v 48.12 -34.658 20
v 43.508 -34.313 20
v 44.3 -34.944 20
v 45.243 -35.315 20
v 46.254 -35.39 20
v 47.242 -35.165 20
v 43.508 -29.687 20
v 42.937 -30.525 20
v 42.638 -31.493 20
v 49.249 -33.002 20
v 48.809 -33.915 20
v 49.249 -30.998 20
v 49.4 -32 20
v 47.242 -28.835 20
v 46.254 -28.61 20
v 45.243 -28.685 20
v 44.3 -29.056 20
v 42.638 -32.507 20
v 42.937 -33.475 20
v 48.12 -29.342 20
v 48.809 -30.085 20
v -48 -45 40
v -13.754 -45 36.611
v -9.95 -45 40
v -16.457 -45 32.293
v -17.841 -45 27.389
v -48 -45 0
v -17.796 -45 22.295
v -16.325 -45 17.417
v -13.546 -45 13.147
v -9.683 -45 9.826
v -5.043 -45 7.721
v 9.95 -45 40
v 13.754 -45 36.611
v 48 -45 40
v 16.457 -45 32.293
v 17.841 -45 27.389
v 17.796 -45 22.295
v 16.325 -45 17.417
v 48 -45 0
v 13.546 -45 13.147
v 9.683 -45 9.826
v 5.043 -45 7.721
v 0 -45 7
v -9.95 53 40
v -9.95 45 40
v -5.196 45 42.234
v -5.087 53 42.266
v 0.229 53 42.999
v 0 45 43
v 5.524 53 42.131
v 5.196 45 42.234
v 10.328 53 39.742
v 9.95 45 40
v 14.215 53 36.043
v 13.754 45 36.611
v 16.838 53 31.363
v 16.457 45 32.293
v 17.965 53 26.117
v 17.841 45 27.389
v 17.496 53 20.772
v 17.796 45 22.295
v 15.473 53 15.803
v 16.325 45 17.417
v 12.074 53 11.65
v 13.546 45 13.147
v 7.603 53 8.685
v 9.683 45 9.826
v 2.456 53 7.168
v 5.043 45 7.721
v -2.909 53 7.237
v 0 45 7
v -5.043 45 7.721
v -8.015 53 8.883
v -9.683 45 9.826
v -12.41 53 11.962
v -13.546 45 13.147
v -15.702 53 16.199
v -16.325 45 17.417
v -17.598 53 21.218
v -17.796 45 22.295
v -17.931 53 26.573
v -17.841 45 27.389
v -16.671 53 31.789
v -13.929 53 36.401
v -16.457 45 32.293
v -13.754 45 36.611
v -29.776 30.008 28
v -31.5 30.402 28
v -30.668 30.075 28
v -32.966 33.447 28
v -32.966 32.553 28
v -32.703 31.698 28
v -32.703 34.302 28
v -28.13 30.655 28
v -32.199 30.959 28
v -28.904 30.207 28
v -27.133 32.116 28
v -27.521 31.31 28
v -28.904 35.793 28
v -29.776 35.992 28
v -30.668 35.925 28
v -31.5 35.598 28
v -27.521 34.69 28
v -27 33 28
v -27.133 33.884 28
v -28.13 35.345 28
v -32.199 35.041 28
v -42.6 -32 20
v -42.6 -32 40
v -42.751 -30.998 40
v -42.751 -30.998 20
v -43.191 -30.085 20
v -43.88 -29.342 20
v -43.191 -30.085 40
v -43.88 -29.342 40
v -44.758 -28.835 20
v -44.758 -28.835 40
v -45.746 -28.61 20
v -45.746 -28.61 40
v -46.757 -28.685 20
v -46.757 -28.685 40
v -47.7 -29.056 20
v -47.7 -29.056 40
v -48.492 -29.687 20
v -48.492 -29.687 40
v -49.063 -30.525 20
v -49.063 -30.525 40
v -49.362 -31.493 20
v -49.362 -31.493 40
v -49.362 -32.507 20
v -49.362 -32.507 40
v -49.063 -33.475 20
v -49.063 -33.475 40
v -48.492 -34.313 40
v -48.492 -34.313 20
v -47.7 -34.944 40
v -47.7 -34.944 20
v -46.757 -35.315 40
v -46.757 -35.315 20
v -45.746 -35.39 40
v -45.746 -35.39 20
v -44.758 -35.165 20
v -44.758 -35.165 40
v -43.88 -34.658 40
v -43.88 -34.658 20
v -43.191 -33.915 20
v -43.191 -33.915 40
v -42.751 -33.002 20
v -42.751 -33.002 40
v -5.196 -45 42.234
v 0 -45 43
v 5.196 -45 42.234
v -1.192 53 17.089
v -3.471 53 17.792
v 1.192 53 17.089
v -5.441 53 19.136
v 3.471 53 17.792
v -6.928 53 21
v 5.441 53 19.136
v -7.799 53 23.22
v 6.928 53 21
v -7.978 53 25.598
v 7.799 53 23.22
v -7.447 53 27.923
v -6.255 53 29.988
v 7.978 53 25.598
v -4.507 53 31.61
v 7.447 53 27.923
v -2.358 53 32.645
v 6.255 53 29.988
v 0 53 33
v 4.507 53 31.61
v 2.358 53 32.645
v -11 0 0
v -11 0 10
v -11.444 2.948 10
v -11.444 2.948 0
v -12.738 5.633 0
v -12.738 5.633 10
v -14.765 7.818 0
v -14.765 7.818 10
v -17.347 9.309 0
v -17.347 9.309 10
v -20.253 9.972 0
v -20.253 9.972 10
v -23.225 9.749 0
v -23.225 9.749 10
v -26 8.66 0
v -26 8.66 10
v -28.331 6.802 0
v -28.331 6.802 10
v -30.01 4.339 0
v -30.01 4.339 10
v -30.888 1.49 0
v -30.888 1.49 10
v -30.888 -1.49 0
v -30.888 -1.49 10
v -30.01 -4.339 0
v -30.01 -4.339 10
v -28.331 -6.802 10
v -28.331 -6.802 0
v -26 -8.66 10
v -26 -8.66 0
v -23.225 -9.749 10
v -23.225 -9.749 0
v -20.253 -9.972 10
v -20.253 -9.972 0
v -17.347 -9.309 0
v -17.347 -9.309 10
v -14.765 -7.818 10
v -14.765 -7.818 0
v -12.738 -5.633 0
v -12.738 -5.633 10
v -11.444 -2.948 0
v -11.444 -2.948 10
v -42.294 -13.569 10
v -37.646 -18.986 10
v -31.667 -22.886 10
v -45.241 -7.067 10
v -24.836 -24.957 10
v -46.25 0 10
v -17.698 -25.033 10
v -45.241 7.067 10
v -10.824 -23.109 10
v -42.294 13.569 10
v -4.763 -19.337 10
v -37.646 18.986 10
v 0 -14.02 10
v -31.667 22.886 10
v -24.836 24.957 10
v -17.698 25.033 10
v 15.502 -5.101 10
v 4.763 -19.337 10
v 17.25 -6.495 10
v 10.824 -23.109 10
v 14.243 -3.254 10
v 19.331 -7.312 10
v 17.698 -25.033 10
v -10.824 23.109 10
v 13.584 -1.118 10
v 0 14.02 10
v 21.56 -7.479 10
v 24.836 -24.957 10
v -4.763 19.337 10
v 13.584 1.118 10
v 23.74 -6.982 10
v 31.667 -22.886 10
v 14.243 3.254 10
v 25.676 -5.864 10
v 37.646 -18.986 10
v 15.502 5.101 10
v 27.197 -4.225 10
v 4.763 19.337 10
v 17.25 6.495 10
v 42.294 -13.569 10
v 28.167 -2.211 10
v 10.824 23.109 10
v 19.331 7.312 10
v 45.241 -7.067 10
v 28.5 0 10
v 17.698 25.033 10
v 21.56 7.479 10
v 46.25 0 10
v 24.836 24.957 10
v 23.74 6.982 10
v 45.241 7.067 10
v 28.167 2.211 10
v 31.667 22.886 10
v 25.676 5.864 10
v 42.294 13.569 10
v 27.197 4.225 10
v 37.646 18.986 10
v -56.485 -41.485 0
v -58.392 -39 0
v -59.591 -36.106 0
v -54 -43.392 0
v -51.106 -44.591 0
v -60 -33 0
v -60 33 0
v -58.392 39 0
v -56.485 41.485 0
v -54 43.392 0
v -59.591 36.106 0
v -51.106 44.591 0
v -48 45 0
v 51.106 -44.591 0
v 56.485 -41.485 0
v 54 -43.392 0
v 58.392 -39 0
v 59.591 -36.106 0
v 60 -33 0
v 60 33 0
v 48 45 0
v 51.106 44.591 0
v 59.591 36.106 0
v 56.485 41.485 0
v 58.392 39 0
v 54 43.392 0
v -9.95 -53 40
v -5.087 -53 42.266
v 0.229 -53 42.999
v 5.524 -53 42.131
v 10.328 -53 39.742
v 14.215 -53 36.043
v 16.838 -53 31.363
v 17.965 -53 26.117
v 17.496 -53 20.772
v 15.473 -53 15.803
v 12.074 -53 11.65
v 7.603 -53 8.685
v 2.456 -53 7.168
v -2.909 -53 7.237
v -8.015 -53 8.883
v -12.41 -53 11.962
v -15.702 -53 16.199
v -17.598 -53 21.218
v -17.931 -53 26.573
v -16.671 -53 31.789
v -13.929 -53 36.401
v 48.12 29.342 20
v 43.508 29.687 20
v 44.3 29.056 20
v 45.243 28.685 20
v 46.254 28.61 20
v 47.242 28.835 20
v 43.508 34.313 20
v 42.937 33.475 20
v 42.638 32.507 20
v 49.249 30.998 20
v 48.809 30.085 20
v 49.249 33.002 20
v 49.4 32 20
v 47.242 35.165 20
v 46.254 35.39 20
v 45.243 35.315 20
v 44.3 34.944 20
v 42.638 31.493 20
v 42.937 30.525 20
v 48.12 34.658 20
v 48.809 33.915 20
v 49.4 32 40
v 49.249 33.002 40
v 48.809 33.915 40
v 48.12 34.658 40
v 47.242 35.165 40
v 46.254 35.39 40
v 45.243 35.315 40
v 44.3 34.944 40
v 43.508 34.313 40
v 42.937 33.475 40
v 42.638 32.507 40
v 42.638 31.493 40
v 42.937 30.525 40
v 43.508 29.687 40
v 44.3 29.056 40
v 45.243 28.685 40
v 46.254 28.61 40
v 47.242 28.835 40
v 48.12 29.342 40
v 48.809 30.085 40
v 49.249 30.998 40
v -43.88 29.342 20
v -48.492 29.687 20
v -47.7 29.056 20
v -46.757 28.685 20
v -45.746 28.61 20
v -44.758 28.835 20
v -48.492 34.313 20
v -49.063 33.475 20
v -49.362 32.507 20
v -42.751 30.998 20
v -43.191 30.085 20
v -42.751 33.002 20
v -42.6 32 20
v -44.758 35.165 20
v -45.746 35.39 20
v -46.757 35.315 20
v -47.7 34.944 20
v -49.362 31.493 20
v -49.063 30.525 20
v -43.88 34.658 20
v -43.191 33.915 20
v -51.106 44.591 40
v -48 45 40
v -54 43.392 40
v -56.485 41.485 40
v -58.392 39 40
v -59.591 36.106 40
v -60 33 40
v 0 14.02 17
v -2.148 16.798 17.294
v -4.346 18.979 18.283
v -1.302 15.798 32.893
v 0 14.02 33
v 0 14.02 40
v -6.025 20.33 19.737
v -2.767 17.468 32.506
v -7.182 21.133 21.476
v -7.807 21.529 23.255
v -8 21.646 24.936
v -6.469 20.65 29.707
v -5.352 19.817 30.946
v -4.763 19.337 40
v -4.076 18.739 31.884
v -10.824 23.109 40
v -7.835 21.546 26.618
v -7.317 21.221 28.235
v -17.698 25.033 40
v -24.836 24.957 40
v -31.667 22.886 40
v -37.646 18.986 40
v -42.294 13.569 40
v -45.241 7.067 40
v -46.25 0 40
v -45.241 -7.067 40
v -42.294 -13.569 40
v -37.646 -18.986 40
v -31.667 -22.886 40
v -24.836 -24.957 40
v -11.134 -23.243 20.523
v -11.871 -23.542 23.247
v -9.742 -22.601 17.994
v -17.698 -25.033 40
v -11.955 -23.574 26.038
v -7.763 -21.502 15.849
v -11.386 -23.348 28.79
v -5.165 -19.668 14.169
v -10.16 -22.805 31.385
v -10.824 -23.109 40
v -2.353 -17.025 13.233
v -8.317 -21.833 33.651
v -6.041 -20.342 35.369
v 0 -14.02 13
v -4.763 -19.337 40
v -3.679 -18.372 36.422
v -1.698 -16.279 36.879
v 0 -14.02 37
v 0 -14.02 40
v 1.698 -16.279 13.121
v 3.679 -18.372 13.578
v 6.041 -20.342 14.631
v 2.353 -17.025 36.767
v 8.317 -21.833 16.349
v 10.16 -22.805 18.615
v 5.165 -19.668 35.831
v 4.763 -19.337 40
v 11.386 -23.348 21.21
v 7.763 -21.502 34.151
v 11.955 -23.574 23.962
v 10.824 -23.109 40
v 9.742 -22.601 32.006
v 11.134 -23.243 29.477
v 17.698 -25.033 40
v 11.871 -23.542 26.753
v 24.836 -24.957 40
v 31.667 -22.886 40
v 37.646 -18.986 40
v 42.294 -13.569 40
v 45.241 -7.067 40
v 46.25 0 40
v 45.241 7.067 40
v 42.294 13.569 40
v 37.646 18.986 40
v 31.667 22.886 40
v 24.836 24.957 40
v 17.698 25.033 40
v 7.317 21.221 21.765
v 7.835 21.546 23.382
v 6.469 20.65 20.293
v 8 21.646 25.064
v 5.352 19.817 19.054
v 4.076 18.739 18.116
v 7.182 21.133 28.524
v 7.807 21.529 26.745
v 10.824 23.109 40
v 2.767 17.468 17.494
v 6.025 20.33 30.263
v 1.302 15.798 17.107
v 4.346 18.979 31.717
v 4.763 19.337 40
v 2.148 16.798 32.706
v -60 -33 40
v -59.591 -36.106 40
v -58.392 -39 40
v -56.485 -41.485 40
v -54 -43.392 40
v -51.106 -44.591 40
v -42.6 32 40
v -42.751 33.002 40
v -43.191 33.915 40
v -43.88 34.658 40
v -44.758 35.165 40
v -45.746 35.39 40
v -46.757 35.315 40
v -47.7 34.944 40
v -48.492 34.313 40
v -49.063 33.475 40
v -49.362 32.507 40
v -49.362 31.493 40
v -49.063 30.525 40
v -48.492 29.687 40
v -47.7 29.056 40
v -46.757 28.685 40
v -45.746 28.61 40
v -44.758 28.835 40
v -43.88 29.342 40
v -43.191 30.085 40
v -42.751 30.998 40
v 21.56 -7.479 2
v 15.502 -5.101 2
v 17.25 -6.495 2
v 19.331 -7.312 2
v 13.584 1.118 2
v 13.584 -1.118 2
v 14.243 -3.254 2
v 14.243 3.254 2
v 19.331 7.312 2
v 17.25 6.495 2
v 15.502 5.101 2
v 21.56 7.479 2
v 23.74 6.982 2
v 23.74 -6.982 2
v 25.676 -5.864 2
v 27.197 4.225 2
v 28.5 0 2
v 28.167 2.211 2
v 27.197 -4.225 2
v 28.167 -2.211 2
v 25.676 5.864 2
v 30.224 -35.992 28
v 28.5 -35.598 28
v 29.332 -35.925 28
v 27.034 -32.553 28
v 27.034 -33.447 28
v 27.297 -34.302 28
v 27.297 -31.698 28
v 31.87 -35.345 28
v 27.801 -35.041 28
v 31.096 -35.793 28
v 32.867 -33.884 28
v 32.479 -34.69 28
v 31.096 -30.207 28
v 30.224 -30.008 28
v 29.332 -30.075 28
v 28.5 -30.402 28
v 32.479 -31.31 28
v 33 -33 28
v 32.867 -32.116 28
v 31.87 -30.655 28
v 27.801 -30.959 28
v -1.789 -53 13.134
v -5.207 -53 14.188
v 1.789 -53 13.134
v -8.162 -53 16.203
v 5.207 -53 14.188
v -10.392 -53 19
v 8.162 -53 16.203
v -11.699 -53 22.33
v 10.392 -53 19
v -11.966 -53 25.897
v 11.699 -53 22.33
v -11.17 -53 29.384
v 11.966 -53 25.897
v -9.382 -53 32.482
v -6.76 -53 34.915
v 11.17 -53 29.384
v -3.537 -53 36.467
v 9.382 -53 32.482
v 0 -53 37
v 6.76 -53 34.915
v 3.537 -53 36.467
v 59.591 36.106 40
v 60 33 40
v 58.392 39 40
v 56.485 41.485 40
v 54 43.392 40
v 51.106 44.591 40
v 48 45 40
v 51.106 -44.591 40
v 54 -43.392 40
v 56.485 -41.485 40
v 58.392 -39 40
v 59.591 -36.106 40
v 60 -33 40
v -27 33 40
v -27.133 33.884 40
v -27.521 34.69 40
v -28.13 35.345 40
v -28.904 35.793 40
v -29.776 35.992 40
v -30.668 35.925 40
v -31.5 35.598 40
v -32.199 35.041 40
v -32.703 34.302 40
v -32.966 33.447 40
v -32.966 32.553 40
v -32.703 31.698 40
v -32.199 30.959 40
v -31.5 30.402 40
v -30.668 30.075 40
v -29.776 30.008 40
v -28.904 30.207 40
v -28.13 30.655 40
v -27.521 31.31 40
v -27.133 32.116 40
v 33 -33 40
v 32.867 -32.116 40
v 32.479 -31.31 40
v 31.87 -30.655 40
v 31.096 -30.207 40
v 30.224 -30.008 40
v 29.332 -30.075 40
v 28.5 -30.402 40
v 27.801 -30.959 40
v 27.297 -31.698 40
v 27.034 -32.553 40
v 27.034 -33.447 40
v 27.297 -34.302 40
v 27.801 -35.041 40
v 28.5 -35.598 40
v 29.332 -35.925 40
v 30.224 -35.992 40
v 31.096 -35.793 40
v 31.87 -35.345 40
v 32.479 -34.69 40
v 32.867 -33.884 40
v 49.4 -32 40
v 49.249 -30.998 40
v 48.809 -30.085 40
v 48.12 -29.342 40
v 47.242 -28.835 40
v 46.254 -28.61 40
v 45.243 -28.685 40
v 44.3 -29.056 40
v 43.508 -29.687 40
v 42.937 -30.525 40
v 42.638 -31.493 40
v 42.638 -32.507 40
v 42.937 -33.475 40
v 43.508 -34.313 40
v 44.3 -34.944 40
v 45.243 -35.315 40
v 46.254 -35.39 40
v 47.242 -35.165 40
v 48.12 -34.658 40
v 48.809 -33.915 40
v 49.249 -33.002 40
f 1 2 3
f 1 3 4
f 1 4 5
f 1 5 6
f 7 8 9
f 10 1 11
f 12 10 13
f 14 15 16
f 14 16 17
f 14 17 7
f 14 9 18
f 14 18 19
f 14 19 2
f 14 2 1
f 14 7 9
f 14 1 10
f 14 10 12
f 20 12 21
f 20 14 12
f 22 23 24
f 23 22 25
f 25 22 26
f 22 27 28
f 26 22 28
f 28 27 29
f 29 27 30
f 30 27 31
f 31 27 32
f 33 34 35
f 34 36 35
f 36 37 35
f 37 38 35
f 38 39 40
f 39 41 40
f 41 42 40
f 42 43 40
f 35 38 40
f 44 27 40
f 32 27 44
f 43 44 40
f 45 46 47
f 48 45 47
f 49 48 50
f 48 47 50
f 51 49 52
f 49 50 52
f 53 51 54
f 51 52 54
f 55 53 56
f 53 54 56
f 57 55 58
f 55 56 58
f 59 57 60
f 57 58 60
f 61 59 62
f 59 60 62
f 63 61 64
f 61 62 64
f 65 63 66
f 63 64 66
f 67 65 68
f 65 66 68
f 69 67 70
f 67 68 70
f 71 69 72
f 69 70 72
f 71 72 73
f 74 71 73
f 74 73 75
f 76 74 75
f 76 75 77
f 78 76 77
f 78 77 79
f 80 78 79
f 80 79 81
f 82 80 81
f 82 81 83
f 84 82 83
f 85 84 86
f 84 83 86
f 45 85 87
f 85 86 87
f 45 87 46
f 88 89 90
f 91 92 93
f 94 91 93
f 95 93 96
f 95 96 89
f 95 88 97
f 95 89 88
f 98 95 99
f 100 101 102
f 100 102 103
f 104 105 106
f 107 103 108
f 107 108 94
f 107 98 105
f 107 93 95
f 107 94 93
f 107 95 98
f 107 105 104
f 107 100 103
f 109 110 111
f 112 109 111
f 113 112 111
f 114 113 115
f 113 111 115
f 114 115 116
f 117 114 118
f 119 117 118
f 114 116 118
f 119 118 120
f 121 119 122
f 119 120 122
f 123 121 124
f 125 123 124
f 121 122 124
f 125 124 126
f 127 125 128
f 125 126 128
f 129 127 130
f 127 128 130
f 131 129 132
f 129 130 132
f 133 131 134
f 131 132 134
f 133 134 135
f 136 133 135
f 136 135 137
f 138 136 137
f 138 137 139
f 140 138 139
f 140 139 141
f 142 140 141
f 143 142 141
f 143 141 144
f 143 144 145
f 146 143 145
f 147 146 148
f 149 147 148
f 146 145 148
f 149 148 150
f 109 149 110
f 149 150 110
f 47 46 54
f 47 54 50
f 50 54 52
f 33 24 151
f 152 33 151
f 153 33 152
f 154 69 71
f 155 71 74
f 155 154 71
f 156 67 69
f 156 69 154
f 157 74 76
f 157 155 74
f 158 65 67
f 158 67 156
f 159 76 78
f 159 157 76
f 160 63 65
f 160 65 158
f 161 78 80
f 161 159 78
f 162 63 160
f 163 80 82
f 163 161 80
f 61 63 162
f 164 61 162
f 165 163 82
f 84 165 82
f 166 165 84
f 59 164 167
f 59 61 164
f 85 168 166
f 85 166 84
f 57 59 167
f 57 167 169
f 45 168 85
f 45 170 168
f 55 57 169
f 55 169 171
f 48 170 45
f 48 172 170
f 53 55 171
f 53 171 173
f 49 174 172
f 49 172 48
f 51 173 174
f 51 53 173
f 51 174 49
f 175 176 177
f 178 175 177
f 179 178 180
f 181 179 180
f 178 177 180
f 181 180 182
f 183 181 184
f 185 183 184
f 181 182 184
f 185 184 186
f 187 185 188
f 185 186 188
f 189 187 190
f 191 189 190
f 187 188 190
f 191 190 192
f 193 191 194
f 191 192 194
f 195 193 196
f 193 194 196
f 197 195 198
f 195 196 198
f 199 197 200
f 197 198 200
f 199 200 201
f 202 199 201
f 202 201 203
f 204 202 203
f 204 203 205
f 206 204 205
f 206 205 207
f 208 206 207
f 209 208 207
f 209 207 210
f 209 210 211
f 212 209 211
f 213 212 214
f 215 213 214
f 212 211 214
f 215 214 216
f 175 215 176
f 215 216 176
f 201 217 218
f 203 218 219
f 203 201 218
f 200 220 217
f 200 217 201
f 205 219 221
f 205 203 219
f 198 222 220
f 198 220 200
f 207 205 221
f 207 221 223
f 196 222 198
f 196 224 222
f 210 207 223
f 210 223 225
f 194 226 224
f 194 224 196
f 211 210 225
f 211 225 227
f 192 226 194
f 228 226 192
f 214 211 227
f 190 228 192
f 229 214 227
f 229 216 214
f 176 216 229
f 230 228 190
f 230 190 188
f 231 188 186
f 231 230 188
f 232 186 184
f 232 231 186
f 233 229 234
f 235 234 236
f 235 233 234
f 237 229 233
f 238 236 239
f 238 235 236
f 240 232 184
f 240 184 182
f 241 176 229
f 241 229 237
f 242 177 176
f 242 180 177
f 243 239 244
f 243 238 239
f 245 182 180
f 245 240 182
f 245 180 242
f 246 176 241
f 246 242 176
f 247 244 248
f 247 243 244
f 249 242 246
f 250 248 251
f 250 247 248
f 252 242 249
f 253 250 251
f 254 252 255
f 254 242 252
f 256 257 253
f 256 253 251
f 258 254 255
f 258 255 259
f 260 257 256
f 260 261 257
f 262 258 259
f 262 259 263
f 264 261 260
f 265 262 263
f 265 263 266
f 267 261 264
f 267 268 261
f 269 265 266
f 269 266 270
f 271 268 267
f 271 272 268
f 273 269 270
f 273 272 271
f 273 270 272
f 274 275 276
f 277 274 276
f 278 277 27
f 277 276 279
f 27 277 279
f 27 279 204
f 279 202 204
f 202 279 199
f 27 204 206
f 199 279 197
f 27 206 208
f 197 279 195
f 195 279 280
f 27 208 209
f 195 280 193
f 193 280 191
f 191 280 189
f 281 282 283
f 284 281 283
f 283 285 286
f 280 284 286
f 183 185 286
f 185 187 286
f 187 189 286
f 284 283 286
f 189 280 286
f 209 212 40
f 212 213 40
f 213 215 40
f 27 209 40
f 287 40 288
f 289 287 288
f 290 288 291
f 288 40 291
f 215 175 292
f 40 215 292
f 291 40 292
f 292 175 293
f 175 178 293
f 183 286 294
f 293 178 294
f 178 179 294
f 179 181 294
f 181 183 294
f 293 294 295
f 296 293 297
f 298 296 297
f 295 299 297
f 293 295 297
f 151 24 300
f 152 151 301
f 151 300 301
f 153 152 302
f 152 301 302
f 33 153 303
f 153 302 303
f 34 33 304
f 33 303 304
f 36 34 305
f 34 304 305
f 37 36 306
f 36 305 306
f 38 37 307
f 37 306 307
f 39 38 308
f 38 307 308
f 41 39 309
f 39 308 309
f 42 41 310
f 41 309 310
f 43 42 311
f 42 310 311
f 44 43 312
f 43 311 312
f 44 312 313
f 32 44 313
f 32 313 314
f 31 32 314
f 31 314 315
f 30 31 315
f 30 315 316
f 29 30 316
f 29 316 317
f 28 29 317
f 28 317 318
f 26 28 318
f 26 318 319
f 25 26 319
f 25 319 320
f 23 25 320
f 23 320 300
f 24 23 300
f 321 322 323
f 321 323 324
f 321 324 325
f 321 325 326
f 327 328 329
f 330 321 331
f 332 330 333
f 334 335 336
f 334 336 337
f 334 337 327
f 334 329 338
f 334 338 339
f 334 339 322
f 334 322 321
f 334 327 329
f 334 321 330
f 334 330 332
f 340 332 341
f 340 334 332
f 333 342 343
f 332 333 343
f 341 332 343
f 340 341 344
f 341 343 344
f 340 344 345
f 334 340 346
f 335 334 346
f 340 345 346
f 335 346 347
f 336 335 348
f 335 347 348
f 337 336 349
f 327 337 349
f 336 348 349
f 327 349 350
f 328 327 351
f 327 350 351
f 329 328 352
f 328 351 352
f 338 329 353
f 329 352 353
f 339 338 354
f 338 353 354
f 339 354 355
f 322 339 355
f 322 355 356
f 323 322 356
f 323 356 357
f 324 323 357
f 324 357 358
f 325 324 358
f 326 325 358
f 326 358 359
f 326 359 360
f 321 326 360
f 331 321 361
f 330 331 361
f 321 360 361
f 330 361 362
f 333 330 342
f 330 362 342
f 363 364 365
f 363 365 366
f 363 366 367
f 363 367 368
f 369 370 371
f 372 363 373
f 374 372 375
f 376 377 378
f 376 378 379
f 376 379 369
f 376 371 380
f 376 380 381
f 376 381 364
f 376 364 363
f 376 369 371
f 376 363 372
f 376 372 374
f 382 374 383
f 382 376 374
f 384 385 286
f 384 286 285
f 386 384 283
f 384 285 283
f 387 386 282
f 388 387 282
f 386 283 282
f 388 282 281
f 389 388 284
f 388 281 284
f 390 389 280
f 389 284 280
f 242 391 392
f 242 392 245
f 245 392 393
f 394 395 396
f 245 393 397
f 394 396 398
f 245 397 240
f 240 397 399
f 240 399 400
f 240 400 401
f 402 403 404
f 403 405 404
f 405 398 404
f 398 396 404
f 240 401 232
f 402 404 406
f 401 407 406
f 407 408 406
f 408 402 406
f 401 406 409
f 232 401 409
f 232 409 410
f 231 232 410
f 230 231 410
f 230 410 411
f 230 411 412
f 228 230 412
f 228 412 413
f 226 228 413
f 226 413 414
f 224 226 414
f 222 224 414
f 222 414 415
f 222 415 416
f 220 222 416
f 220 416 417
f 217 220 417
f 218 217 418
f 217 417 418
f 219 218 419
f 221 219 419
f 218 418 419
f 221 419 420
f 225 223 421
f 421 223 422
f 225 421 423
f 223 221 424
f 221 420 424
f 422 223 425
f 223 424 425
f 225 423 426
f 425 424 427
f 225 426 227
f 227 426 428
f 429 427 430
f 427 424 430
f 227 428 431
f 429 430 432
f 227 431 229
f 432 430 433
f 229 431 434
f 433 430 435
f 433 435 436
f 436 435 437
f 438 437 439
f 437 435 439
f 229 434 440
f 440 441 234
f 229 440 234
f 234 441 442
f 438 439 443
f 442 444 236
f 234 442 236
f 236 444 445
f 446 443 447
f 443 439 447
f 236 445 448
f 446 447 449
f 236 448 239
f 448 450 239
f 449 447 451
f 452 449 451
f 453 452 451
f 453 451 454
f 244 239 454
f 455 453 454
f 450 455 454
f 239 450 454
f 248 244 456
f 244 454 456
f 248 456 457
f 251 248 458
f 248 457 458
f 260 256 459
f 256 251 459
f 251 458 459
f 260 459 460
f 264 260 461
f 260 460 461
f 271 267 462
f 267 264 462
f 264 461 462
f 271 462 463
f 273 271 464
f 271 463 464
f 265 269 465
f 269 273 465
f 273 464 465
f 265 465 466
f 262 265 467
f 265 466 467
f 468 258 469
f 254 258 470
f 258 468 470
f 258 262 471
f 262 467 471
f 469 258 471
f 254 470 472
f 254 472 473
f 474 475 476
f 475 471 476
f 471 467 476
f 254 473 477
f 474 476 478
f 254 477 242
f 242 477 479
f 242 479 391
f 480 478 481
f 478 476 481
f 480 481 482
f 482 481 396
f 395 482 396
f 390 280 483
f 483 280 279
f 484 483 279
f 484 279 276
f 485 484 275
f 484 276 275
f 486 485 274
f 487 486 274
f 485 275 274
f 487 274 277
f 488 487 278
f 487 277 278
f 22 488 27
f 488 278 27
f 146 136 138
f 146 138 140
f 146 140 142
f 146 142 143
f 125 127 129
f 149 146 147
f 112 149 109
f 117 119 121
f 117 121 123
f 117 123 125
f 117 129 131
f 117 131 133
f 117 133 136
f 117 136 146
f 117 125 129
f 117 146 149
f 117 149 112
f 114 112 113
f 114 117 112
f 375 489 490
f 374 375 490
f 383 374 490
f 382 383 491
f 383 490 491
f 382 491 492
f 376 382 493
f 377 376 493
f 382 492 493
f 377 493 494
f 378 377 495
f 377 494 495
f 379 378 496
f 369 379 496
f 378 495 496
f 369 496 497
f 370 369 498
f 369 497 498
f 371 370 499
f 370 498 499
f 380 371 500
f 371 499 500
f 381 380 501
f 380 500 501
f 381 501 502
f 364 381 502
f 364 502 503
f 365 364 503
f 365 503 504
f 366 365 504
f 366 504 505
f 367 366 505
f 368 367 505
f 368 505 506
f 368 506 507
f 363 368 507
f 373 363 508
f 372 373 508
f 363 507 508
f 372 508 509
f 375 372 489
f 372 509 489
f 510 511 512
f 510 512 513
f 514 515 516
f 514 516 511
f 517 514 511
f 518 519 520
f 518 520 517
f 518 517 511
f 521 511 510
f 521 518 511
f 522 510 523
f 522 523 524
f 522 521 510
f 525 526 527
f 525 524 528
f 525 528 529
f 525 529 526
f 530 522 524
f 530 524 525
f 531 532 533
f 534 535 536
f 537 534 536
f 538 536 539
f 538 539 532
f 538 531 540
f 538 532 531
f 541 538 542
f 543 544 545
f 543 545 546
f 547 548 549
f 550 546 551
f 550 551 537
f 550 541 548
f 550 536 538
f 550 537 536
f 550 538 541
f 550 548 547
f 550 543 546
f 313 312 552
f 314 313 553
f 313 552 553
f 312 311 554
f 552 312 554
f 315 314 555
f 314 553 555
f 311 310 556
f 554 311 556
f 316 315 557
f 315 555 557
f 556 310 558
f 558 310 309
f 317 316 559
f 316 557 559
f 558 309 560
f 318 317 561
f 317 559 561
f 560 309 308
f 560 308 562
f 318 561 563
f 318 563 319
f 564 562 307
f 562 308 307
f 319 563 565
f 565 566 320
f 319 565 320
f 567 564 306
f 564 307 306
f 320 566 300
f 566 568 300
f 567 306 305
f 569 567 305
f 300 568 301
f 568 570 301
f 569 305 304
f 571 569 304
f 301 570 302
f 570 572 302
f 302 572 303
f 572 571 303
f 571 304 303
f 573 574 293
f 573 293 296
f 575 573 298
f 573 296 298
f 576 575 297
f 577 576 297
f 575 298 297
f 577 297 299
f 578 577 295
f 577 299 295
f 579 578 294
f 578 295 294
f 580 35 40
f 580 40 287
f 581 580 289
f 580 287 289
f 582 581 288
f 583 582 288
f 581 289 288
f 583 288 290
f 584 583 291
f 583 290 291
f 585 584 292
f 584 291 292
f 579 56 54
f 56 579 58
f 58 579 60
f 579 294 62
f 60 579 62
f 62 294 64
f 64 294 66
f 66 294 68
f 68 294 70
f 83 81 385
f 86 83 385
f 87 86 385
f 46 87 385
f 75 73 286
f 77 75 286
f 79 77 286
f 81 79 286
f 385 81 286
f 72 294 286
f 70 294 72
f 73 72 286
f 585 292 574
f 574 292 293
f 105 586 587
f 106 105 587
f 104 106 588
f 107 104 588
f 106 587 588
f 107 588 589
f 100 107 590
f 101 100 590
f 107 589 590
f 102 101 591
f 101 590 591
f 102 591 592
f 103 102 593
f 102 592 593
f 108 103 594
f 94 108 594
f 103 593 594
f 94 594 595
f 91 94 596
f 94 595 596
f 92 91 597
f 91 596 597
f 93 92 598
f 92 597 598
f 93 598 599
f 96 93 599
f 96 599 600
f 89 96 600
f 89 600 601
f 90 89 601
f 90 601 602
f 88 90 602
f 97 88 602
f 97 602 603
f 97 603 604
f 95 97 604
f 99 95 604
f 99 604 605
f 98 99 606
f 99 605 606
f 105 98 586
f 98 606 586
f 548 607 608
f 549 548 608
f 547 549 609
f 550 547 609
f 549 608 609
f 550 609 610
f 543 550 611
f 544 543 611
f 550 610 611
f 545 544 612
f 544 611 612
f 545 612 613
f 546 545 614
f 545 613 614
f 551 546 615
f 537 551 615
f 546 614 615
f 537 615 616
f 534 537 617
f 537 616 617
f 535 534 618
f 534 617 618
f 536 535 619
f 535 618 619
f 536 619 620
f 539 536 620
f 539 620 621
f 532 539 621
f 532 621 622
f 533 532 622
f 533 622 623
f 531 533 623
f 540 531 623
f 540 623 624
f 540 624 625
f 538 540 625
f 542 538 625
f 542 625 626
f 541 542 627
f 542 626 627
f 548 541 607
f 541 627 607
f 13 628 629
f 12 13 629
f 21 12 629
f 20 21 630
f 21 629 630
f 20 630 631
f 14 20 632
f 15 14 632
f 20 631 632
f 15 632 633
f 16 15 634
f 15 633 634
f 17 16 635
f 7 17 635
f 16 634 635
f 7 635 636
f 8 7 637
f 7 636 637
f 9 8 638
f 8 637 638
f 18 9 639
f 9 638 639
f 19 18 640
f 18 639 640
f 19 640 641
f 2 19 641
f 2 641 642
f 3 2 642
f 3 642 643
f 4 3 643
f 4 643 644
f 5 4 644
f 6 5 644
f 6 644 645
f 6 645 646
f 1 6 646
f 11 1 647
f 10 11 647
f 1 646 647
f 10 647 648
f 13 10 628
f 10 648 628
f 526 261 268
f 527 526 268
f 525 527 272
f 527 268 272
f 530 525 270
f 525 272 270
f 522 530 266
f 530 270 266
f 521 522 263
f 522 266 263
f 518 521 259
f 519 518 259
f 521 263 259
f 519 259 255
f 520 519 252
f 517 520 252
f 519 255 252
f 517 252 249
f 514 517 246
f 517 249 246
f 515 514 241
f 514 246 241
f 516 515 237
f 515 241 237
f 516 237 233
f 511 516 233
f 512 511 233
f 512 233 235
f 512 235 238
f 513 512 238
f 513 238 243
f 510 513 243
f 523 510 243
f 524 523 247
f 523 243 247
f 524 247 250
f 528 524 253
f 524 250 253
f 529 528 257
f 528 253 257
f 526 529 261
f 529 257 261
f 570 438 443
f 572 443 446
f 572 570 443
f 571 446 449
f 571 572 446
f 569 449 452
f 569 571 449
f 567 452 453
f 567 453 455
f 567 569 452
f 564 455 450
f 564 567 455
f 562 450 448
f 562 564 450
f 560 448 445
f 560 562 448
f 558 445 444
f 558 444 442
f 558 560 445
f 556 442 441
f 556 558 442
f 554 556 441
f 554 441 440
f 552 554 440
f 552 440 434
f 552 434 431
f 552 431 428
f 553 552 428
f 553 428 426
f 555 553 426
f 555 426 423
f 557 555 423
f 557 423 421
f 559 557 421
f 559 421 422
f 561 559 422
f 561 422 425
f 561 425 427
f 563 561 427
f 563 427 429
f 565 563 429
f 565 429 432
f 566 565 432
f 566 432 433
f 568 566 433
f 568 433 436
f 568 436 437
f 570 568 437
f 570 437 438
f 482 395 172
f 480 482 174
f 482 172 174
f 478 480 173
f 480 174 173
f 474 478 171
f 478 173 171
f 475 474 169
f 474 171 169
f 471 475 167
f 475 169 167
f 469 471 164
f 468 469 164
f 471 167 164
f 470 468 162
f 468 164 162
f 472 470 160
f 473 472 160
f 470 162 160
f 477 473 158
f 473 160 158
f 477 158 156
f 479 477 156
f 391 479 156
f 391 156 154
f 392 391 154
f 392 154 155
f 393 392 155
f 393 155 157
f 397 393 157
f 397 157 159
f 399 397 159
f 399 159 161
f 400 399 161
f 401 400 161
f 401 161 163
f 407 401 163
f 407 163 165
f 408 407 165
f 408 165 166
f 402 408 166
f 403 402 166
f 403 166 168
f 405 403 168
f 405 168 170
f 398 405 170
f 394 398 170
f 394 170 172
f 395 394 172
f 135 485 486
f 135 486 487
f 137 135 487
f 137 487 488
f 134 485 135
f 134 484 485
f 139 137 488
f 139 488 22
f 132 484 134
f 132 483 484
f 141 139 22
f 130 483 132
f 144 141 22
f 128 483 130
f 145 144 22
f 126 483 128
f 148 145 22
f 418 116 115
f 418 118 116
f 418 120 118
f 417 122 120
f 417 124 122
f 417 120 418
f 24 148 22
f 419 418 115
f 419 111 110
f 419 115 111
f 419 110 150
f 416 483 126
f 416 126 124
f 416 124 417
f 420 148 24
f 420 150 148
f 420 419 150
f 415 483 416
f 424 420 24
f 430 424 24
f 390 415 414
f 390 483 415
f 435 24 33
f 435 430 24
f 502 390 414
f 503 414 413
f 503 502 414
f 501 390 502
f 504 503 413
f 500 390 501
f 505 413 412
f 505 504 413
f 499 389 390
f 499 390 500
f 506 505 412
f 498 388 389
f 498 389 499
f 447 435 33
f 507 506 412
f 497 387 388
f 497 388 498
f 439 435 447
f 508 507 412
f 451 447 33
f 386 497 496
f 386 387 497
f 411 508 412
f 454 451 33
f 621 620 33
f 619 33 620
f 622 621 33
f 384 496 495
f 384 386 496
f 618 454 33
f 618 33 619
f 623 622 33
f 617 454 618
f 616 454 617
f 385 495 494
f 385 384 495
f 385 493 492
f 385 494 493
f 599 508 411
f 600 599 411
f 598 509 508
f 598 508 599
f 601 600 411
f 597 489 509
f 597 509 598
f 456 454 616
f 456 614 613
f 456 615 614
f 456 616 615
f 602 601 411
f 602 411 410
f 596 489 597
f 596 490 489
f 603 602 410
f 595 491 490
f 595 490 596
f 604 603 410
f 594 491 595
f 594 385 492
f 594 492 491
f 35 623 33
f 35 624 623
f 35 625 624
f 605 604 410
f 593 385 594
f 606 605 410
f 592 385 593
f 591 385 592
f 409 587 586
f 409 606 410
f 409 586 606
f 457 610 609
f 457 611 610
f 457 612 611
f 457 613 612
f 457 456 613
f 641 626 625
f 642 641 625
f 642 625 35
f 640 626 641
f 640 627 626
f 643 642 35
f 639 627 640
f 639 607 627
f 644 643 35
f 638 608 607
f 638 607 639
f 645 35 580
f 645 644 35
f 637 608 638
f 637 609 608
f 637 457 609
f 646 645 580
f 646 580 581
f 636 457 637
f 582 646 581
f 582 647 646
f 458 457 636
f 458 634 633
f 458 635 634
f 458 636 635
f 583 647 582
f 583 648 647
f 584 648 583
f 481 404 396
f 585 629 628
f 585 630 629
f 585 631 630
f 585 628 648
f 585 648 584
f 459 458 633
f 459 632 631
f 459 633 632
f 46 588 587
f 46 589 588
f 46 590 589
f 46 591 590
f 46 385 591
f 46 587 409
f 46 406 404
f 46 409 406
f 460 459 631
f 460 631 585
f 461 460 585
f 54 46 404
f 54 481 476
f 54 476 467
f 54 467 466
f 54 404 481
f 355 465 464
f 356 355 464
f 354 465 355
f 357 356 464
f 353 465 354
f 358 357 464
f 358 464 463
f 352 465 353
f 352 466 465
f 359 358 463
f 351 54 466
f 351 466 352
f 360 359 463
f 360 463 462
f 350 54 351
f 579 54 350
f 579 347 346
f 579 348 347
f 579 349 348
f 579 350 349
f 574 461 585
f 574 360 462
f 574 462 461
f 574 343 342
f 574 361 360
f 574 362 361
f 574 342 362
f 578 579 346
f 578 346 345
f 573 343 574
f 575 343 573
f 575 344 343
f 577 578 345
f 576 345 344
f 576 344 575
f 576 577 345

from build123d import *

# Parameters (mm, degrees)
EXTRUDE_1_DEPTH     = 40
SKETCH_2_R          = 18
EXTRUDE_2_DEPTH     = 8
EXTRUDE_START       = -8
SKETCH_3_R          = 18
EXTRUDE_3_DEPTH     = 8
SKETCH_4_R          = 25.25
CUT_EXTRUDE_1_DEPTH = 30
SKETCH_5_R          = 25.25
CUT_EXTRUDE_2_DEPTH = 30
SKETCH_6_R          = 10
CUT_EXTRUDE_3_DEPTH = 10
SKETCH_7_R          = 7.5
CUT_EXTRUDE_4_DEPTH = 8
SKETCH_8_R          = 12
CUT_EXTRUDE_5_DEPTH = 40
SKETCH_9_R          = 8
CUT_EXTRUDE_6_DEPTH = 40
SKETCH_10_R         = 3.4
CUT_EXTRUDE_7_DEPTH = 20
SKETCH_11_R         = 3
CUT_EXTRUDE_8_DEPTH = 12


with BuildPart() as part:
    # 草图1 → 凸台-拉伸1 (new body)
    with BuildSketch(Plane.XY):
        with BuildLine():
            Line((-48, -45), (48, -45))
            ThreePointArc((48, -45), (56.485281374, -41.485281374), (60, -33))
            Line((60, -33), (60, 33))
            ThreePointArc((60, 33), (56.485281374, 41.485281374), (48, 45))
            Line((48, 45), (-48, 45))
            ThreePointArc((-48, 45), (-56.485281374, 41.485281374), (-60, 33))
            Line((-60, 33), (-60, -33))
            ThreePointArc((-60, -33), (-56.485281374, -41.485281374), (-48, -45))
        make_face()
    extrude(amount=EXTRUDE_1_DEPTH)

    # 草图2 → 凸台-拉伸2 (add)
    with BuildSketch(Plane(origin=(0, 45, 0), x_dir=(1, 0, 0), z_dir=(0, 1, 0))):
        with Locations(Location((0, -25, 0), (0, 0, 236.442690238))):
            Circle(SKETCH_2_R)
    extrude(amount=EXTRUDE_2_DEPTH)

    # 草图3 → 凸台-拉伸3 (add)
    with BuildSketch(Plane(origin=(0, -45, 0), x_dir=(1, 0, 0), z_dir=(0, 1, 0)).offset(EXTRUDE_START)):
        with Locations(Location((0, -25, 0), (0, 0, 236.442690238))):
            Circle(SKETCH_3_R)
    extrude(amount=EXTRUDE_3_DEPTH)

    # 草图4 → 切除-拉伸1 (cut)
    with BuildSketch(Plane.XY.offset(40)):
        with Locations((-21, 0)):
            Circle(SKETCH_4_R)
    extrude(amount=-CUT_EXTRUDE_1_DEPTH, mode=Mode.SUBTRACT)

    # 草图5 → 切除-拉伸2 (cut)
    with BuildSketch(Plane.XY.offset(40)):
        with Locations((21, 0)):
            Circle(SKETCH_5_R)
    extrude(amount=-CUT_EXTRUDE_2_DEPTH, mode=Mode.SUBTRACT)

    # 草图6 → 切除-拉伸3 (cut)
    with BuildSketch(Plane.XY.offset(10)):
        with Locations((-21, 0)):
            Circle(SKETCH_6_R)
    extrude(amount=-CUT_EXTRUDE_3_DEPTH, mode=Mode.SUBTRACT)

    # 草图7 → 切除-拉伸4 (cut)
    with BuildSketch(Plane.XY.offset(10)):
        with Locations((21, 0)):
            Circle(SKETCH_7_R)
    extrude(amount=-CUT_EXTRUDE_4_DEPTH, mode=Mode.SUBTRACT)

    # 草图8 → 切除-拉伸5 (cut)
    with BuildSketch(Plane(origin=(0, -53, 0), x_dir=(1, 0, 0), z_dir=(0, 1, 0))):
        with Locations(Location((0, -25, 0), (0, 0, 270))):
            Circle(SKETCH_8_R)
    extrude(amount=CUT_EXTRUDE_5_DEPTH, mode=Mode.SUBTRACT)

    # 草图9 → 切除-拉伸6 (cut)
    with BuildSketch(Plane(origin=(0, 53, 0), x_dir=(1, 0, 0), z_dir=(0, 1, 0))):
        with Locations(Location((0, -25, 0), (0, 0, 270))):
            Circle(SKETCH_9_R)
    extrude(amount=-CUT_EXTRUDE_6_DEPTH, mode=Mode.SUBTRACT)

    # 草图10 → 切除-拉伸7 (cut)
    with BuildSketch(Plane.XY.offset(40)):
        with Locations((-46, 32)):
            Circle(SKETCH_10_R)
        with Locations((46, 32)):
            Circle(SKETCH_10_R)
        with Locations((-46, -32)):
            Circle(SKETCH_10_R)
        with Locations((46, -32)):
            Circle(SKETCH_10_R)
    extrude(amount=-CUT_EXTRUDE_7_DEPTH, mode=Mode.SUBTRACT)

    # 草图11 → 切除-拉伸8 (cut)
    with BuildSketch(Plane.XY.offset(40)):
        with Locations((-30, 33)):
            Circle(SKETCH_11_R)
        with Locations((30, -33)):
            Circle(SKETCH_11_R)
    extrude(amount=-CUT_EXTRUDE_8_DEPTH, mode=Mode.SUBTRACT)


solid = part.part
